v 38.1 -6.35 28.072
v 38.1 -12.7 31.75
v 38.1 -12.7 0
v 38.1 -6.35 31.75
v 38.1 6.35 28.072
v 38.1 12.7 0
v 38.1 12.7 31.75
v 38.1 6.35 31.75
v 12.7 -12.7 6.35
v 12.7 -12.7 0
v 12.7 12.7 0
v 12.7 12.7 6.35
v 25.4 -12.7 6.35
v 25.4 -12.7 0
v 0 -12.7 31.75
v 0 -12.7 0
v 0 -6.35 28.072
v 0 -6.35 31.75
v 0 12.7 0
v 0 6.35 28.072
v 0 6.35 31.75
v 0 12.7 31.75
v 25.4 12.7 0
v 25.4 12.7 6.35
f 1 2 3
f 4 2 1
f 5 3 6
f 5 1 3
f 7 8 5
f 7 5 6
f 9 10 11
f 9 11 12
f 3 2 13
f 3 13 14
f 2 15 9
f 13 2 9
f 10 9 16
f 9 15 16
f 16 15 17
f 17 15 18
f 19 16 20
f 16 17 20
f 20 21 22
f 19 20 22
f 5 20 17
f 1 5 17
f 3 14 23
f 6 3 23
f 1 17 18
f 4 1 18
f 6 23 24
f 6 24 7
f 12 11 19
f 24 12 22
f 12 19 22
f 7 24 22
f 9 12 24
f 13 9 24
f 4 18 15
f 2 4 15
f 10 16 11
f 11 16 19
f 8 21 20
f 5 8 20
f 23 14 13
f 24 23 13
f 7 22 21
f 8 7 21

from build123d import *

# Parameters (mm, degrees)
F1_DEPTH = 38.1
F2_W     = 12.7
F2_H     = 6.35
F3_DEPTH = 25.4
F4_DEPTH = 50.8
F5_DEPTH = 25.4


with BuildPart() as f1:
    # F0 (on Right) → F1 (new body)
    with BuildSketch(Plane.YZ):
        Polygon((-12.7, 0), (0, 0), (12.7, 0), (12.7, 31.75), (6.35, 31.75), (6.35, 28.071857), (-6.35, 28.071857), (-6.35, 31.75), (-12.7, 31.75), align=None)
    extrude(amount=F1_DEPTH)

    # F2 (on Front) → F3 (cut)
    with BuildSketch(Plane.XZ):
        with Locations((19.05, 3.175)):
            Rectangle(F2_W, F2_H)
    extrude(amount=-F3_DEPTH, mode=Mode.SUBTRACT)

    # F2 (on Front) → F4 (cut)
    with BuildSketch(Plane.XZ):
        with Locations((19.05, 3.175)):
            Rectangle(F2_W, F2_H)
    extrude(amount=-F4_DEPTH, mode=Mode.SUBTRACT)

    # F2 (on Front) → F5 (cut)
    with BuildSketch(Plane.XZ):
        with Locations((19.05, 3.175)):
            Rectangle(F2_W, F2_H)
    extrude(amount=F5_DEPTH, mode=Mode.SUBTRACT)


solid = f1.part
